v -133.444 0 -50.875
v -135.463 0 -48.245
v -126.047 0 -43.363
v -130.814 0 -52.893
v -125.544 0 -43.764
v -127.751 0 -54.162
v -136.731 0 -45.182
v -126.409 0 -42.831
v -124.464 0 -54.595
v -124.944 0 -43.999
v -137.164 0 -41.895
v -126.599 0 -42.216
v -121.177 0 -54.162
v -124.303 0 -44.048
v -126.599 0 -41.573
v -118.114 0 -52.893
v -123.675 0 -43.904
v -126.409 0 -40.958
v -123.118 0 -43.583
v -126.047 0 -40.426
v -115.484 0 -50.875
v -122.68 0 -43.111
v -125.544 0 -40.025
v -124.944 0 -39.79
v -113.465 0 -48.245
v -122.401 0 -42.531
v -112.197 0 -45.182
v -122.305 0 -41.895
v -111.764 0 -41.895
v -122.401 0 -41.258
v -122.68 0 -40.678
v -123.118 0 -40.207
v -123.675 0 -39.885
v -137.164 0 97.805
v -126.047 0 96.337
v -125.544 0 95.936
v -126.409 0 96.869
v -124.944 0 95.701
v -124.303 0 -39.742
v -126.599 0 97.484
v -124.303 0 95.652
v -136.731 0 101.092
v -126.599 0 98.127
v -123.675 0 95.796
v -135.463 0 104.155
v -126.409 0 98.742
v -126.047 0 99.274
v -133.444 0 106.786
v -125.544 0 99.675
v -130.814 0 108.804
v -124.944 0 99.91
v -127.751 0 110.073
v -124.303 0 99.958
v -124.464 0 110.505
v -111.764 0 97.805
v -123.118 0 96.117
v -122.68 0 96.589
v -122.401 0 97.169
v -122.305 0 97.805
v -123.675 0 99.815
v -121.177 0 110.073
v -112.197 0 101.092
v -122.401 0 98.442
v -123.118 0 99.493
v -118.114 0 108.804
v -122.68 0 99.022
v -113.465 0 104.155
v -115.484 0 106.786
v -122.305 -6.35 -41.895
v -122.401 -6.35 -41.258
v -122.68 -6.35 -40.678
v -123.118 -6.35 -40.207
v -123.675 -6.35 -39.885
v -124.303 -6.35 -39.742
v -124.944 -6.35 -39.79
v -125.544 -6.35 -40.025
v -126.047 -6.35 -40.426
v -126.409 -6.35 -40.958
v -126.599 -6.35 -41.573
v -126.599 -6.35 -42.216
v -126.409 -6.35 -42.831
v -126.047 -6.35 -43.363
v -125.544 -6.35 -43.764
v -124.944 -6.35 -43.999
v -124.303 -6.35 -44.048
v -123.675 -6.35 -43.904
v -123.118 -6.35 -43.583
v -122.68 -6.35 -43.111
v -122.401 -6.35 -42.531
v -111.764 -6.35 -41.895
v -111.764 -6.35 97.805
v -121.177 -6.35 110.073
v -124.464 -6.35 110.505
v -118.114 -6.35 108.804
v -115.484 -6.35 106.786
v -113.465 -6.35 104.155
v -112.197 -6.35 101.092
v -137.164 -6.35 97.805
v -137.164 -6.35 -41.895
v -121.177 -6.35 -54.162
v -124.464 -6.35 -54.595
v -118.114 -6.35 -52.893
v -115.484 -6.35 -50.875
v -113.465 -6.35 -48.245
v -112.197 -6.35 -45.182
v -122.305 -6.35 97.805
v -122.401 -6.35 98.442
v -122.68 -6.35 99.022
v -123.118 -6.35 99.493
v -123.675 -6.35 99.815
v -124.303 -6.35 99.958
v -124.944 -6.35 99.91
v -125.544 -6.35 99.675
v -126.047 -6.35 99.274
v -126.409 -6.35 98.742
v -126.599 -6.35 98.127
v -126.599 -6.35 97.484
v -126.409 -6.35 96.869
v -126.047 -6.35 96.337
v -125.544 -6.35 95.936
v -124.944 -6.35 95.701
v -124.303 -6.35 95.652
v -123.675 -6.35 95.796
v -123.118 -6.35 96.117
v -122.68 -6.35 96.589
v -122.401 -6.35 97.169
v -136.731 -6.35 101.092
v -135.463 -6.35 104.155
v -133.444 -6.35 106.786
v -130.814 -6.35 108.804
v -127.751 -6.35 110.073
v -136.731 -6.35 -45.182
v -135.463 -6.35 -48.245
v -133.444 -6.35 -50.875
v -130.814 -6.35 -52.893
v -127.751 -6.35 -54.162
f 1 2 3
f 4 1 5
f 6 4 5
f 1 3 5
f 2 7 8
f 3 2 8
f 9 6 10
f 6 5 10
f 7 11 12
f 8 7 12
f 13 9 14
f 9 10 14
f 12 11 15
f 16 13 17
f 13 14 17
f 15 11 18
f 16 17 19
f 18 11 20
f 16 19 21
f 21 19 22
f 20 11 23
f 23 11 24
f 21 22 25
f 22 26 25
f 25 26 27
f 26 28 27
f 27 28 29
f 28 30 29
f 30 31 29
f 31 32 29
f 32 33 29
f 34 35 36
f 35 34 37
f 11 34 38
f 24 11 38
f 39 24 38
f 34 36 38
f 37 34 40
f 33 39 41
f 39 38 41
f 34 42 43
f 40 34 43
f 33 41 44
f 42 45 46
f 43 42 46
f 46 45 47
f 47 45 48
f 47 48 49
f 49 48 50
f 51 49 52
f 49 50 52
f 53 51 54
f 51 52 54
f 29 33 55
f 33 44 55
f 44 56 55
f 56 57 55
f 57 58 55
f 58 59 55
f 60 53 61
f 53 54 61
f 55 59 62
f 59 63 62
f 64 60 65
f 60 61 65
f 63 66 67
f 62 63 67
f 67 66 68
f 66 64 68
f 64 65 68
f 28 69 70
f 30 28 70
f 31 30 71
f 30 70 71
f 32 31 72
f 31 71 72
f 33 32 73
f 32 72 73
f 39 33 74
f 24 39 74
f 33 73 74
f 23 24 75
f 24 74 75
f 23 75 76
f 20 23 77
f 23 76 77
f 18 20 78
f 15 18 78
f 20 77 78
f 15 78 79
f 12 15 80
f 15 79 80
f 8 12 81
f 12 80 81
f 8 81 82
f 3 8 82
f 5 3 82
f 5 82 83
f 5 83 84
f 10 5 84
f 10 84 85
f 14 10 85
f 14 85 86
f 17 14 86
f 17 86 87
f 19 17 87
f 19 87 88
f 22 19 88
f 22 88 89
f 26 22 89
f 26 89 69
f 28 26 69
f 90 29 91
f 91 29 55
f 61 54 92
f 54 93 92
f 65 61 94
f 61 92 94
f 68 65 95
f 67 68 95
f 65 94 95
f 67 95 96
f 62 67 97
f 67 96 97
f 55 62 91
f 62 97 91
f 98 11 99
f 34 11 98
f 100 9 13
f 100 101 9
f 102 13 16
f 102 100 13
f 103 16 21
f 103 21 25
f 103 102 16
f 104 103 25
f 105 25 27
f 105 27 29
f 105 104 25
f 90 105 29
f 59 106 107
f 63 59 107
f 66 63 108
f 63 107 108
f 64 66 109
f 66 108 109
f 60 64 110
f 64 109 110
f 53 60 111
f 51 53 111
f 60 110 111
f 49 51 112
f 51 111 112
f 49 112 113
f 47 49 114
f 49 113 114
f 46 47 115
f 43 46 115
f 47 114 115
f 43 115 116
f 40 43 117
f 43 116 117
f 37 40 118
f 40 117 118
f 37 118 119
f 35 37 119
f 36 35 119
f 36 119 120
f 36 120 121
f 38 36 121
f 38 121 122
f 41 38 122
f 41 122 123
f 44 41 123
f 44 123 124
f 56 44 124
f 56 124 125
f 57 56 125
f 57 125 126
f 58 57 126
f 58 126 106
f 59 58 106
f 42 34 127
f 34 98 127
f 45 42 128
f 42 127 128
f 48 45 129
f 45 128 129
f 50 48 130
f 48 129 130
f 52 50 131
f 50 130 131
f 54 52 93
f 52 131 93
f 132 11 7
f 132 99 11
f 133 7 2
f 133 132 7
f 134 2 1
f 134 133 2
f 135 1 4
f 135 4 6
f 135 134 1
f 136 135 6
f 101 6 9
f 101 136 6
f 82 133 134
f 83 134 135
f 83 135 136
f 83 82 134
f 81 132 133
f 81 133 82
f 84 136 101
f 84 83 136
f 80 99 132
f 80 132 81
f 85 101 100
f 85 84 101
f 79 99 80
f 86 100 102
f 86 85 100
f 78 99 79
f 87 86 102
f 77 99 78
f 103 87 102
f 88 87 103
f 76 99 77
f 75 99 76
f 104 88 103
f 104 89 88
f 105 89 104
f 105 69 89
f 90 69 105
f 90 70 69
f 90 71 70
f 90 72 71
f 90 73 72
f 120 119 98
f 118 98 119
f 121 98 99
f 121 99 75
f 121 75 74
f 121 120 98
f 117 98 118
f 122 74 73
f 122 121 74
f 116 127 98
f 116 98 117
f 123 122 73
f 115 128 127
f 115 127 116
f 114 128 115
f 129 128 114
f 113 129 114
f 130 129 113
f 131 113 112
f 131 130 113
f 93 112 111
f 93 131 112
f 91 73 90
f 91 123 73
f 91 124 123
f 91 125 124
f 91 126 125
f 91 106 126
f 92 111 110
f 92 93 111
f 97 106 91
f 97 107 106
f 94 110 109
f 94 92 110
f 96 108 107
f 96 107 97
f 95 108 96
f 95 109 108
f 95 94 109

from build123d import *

# Parameters (mm, degrees)
F0_W     = 25.4
F0_H     = 165.1
F1_DEPTH = 6.35
F2_R     = 2.159
F3_DEPTH = 25.4
F4_R     = 12.69999


# Not quite as in the source:
# - a fillet or chamfer is up to 0.001 mm smaller than in the source, because OpenCascade refuses the exact size


with BuildPart() as f1:
    # F0 (on Front) → F1 (new body)
    with BuildSketch(Plane.XZ):
        with Locations((-124.4640206625, 27.955437386)):
            Rectangle(F0_W, F0_H)
    extrude(amount=F1_DEPTH)

    # F2 (on face) → F3 (cut)
    with BuildSketch(Plane.XZ.offset(6.35)):
        with Locations((-124.4640206625, 97.805437386)):
            Circle(F2_R)
        with Locations((-124.4640206625, -41.894562614)):
            Circle(F2_R)
    extrude(amount=-F3_DEPTH, mode=Mode.SUBTRACT)

    # F4 (radius 12.7 in the source; OpenCascade refuses exactly that, so slightly less here)
    f4_edges = [f1.edges().sort_by_distance(p)[0] for p in [
        (-137.164021, -3.175, 110.505437),
        (-111.764021, -3.175, 110.505437),
        (-137.164021, -3.175, -54.594563),
        (-111.764021, -3.175, -54.594563),
    ]]
    fillet(f4_edges, radius=F4_R)


solid = f1.part
